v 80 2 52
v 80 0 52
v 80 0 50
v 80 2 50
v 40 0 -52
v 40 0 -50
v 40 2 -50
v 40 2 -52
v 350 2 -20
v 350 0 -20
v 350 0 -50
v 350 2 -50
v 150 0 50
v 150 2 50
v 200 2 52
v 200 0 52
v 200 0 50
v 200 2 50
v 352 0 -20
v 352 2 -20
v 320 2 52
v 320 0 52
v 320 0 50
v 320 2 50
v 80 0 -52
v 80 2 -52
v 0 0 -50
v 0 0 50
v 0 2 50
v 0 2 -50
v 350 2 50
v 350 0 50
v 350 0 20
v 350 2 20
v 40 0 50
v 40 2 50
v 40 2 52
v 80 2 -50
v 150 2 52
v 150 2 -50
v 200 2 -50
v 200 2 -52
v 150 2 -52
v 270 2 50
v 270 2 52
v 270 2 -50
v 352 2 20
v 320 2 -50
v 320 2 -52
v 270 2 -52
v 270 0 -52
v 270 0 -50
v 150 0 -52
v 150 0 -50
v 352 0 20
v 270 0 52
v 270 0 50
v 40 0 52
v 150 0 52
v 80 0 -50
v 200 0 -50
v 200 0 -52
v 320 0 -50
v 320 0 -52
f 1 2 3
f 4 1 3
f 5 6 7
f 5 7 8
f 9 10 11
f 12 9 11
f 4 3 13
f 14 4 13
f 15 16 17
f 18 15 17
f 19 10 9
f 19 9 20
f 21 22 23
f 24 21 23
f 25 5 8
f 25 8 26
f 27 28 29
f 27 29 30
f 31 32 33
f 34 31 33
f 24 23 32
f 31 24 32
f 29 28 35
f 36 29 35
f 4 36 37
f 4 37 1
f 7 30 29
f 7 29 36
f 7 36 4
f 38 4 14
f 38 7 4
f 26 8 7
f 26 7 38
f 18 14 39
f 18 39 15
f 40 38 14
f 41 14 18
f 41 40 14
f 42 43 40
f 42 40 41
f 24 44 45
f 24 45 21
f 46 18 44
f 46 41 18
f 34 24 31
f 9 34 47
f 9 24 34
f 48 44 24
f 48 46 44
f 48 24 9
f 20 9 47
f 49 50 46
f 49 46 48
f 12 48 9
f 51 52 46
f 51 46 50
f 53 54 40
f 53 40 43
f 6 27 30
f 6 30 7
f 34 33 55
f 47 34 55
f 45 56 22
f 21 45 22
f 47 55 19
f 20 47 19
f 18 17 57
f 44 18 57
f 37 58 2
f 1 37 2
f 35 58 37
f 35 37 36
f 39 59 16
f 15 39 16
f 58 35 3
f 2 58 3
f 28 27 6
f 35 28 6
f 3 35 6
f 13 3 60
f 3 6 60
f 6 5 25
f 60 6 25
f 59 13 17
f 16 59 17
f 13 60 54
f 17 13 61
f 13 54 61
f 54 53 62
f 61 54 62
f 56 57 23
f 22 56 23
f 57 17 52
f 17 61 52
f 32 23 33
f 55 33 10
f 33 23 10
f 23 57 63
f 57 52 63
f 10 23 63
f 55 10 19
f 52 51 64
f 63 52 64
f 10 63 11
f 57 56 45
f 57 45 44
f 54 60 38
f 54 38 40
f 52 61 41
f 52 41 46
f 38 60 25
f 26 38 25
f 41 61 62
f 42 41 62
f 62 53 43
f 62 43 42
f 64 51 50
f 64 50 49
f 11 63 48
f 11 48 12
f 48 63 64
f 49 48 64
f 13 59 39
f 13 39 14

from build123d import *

# Parameters (mm, degrees)
SKETCH_1_W      = 40
SKETCH_1_H      = 2
SKETCH_1_W_2    = 50
SKETCH_1_W_3    = 350
SKETCH_1_H_2    = 100
EXTRUDE_1_DEPTH = 2
SKETCH_2_W      = 2
SKETCH_2_H      = 40
EXTRUDE_2_DEPTH = 2


with BuildPart() as part:
    # 草图1 → 凸台-拉伸1 (new body)
    with BuildSketch(Plane(origin=(0, 0, 0), x_dir=(1, 0, 0), z_dir=(0, 1, 0))):
        with Locations((60, 51)):
            Rectangle(SKETCH_1_W, SKETCH_1_H)
        with Locations((60, -51)):
            Rectangle(SKETCH_1_W, SKETCH_1_H)
        with Locations((175, 51)):
            Rectangle(SKETCH_1_W_2, SKETCH_1_H)
        with Locations((175, -51)):
            Rectangle(SKETCH_1_W_2, SKETCH_1_H)
        with Locations((295, 51)):
            Rectangle(SKETCH_1_W_2, SKETCH_1_H)
        with Locations((295, -51)):
            Rectangle(SKETCH_1_W_2, SKETCH_1_H)
        with Locations((175, 0)):
            Rectangle(SKETCH_1_W_3, SKETCH_1_H_2)
    extrude(amount=EXTRUDE_1_DEPTH)

    # 草图2 → 凸台-拉伸2 (add)
    with BuildSketch(Plane(origin=(0, 0, 0), x_dir=(1, 0, 0), z_dir=(0, 1, 0))):
        with Locations((351, 0)):
            Rectangle(SKETCH_2_W, SKETCH_2_H)
    extrude(amount=EXTRUDE_2_DEPTH)


solid = part.part
